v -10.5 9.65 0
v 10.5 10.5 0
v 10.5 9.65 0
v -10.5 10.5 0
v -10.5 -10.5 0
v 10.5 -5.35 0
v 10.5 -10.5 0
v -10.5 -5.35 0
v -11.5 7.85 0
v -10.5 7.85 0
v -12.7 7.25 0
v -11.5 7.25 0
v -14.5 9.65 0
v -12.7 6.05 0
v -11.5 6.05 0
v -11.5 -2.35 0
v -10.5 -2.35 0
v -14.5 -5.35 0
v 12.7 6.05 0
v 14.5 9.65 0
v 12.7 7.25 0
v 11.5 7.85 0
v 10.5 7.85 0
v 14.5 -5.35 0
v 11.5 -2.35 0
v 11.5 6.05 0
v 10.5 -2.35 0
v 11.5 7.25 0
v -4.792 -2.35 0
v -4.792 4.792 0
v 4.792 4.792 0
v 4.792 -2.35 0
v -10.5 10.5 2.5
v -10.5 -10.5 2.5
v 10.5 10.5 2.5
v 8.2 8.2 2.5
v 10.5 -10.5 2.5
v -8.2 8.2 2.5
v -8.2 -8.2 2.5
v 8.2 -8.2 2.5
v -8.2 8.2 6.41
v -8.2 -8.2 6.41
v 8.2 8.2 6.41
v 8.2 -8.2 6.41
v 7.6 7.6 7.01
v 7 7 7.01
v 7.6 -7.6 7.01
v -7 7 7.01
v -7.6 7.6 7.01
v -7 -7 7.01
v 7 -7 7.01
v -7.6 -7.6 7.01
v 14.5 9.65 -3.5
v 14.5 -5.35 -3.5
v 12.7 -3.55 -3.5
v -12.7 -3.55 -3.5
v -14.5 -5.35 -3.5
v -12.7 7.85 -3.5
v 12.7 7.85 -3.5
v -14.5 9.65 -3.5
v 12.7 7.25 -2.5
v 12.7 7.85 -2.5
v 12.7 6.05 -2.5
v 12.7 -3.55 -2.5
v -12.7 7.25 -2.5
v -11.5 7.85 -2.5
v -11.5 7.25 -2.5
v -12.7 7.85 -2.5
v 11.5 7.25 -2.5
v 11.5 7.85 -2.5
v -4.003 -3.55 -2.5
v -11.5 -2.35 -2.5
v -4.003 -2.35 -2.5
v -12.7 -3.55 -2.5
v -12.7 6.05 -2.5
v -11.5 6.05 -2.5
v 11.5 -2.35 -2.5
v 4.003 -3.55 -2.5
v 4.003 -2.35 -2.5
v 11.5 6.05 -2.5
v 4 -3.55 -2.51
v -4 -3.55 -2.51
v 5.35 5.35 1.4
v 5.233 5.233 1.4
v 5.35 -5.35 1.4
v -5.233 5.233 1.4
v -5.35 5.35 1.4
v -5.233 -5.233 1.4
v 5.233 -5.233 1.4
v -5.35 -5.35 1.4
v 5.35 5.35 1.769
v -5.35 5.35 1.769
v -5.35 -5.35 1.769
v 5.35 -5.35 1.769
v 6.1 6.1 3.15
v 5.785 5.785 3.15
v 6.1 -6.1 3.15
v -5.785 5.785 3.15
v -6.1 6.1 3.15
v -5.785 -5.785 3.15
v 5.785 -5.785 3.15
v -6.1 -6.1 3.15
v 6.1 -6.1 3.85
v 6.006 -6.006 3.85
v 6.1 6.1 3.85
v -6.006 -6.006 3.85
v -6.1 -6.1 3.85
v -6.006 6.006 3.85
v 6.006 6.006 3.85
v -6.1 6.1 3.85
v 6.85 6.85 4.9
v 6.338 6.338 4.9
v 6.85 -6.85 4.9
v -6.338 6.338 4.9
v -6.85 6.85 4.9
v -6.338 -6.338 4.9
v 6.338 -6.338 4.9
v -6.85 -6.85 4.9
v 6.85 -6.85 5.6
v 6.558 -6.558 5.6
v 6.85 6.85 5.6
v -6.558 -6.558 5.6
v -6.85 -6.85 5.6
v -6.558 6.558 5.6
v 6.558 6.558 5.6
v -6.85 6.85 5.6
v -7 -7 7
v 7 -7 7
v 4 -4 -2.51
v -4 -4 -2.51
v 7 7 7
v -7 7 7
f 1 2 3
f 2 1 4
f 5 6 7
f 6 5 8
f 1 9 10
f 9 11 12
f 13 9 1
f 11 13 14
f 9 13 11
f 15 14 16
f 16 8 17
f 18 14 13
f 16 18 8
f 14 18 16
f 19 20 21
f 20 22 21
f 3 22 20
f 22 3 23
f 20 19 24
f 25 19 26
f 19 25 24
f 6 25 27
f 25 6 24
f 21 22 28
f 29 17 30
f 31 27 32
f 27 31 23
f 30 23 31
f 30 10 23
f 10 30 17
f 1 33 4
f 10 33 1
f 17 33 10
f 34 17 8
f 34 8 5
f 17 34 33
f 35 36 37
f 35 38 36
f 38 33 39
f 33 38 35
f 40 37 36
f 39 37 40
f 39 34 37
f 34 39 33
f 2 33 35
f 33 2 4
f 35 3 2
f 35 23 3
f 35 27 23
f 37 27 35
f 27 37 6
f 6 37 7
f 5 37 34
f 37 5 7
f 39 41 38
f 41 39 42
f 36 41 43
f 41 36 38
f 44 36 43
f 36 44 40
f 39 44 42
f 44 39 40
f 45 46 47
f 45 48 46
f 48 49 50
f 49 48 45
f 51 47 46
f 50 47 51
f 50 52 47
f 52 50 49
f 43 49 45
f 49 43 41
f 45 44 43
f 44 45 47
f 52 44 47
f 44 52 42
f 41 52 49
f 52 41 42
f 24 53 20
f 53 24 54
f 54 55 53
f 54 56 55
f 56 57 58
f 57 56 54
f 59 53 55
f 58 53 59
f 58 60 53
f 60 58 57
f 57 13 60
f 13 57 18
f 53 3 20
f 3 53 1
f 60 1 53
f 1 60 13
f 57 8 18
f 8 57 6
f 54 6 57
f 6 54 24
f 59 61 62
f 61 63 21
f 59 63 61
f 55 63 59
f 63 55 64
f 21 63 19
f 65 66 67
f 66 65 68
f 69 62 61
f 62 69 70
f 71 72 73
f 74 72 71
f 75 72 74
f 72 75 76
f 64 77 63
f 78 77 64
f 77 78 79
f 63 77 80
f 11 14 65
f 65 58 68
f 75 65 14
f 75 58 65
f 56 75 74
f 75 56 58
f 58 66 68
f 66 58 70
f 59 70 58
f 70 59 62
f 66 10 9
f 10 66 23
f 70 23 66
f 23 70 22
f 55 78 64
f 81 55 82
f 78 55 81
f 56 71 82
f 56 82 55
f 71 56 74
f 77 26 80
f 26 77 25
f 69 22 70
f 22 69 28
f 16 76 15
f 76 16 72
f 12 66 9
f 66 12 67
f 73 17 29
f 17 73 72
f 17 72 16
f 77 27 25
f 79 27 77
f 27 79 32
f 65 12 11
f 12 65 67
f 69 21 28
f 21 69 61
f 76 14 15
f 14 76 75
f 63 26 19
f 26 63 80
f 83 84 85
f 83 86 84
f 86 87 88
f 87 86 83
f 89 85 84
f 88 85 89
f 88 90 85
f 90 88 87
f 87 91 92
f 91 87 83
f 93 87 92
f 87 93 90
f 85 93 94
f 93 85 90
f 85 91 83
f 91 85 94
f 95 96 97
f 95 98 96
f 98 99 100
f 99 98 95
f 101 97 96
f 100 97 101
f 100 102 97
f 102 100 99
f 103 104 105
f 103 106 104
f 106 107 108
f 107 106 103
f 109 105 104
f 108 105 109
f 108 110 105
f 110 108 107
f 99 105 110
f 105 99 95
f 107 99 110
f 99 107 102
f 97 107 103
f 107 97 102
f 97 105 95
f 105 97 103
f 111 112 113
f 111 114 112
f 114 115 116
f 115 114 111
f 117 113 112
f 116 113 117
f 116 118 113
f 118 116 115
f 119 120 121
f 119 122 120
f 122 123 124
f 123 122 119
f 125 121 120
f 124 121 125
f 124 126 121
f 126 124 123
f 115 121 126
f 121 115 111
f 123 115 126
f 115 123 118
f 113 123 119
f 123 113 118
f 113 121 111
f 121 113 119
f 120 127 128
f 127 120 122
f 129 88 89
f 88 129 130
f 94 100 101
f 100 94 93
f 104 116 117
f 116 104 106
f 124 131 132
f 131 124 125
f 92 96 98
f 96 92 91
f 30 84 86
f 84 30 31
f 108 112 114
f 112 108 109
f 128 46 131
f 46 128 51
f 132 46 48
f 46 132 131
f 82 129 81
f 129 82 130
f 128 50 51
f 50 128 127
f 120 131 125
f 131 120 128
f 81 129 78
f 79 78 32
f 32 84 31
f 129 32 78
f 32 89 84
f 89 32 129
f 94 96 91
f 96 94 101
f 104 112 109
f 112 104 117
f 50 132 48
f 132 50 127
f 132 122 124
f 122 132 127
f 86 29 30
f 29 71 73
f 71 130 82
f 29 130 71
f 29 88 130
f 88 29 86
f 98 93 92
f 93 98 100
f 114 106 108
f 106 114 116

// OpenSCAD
// VL53L0X carrier for Bender's LEFT eye.
//
// WHY HERE, AND NOT THE SEAM BETWEEN THE EYES
// -------------------------------------------
// The seam cannot take the board. Measured from the DroidFactory meshes on the
// NAS, and confirmed against the built head:
//
//   eyeball sphere diameter   89.43 mm   (119.240 mm stock, printed at 75%)
//   eye centre spacing        92.88 mm   (owner's calipers)
//   GAP BETWEEN THE EYEBALLS   3.45 mm
//
// The board is 11 mm wide. An 11 mm slot first appears 17.98 mm behind the eye
// centre plane, and the eyeballs stop existing at 23.29 mm, so there is a 3 mm
// window. A sensor in that window still has to see forward through the 3.45 mm
// throat at the equator. The VL53L0X's own emitter-to-receiver span is 4.4 mm,
// wider than the throat. Nothing usable gets out, and the sphere surfaces sit
// in the beam feeding it crosstalk.
//
// The owner's own custom eye solved it instead. BenderEye-Cust.FCStd hollows
// the stock eyeball, flat-cuts the back 31.06 mm behind centre (23.29 mm at
// 75%), and cuts a 22 x 22 mm square hole straight through the front on the
// eye axis. Printed, that hole measures 16.7 mm square. It is the twin of the
// one the Camera Module 3 looks through in the right eye, and it is already
// aimed exactly where a child stands.
//
// AXES
//   +z is forward, toward the child.
//   z = 0 is the flange's back face, which is also where the board's front
//   face lands. The die then looks straight up the bore.
//
// ORIENTATION AT ASSEMBLY
//   The snout is square, so the part drops into the square aperture in any of
//   four rotations. Pick whichever sends the header and its cable towards the
//   open back cut of the eye shell. Nothing in this file depends on it.
//
// FITTING
//   1. Slide the snout into the aperture from INSIDE the hollow eye shell.
//   2. The flange stops it and bears on the inner face of the eye's front wall.
//      That face is spherical and this flange is flat, so a gap of about 1 mm
//      is expected at the corners. Glue fills it.
//   3. Drop the board into the rails, face forward, die towards the bore.
//   4. Slide along the rails until the die is centred in the aperture. Sight
//      it through the front of the eye. The tolerance is wide: the beam is
//      7.50 mm across at the snout mouth inside a 14 mm bore, so the die may
//      sit over 3 mm off centre before anything clips.
//   5. Lock it. Two M3 screws if `posts` is true and the pitch below is right,
//      otherwise a dab of glue on the rails.
//
// NO WINDOW. Do not cover the aperture with acrylic or film. A cover needs the
// crosstalk calibration that the Adafruit CircuitPython driver does not expose.
// Print in matt BLACK. A reflective bore returns a short, STABLE reading with
// nobody there, and that latches the presence gate open while looking exactly
// like a healthy sensor. After fitting, set `presence_min_mm` from
// `venv/bin/python scripts/probe_vl53l0x.py --baseline`.

$fn = 64;

// ---------------------------------------------------------------------------
// Eye. MEASURED -- do not guess these.
// ---------------------------------------------------------------------------
aperture      = 16.7;   // square bore through the eye's front wall, calipers.
                        // Nominal 22.0 mm in CAD at 100%, 16.50 mm at 75%.
aperture_fit  = 0.30;   // clearance so the snout slides rather than forces
snout_len     = 4.5;    // The 16.7 mm bore is only 4.76 mm long: in front of
                        // it sits the stock 18.40 mm pupil recess, 3.26 mm
                        // deep. 4.5 keeps the snout in the bore it locates on.

// ---------------------------------------------------------------------------
// Board. The PCB is NOT flat on either face, and that drove this redesign.
// ---------------------------------------------------------------------------
board_l       = 25.0;   // MEASURED, lug tip to lug tip
board_w       = 11.0;   // MEASURED body width
board_t       = 1.0;    // MEASURED PCB thickness
board_fit     = 0.40;   // clearance around the board in the tray

// FRONT face, the side that looks at the child. Two things stand proud:
// the sensor package at about 1 mm, and the header's solder tails at about
// 2 mm. The board therefore cannot lie flat on the flange. It stands off by
// front_proj and rests on a ledge, with the middle relieved.
front_proj    = 2.5;    // CONFIRM from the photo. Must clear the TALLER of
                        // the two, with a little to spare.
die_h         = 1.0;    // MEASURED package height above the PCB front face
die_pkg_x     = 5.0;    // MEASURED package footprint
die_pkg_y     = 2.7;

// Die position, relative to the CENTRE of the board. The bore is aimed at the
// die, not at the board, so these two numbers decide where the tray sits.
// MEASURED: the package is mid-length, and sits 2.0 mm clear of the long edge
// opposite the header. Package is 2.7 mm across, so its centre is
// 2.0 + 1.35 = 3.35 mm from that edge, i.e. 5.5 - 3.35 = 2.15 mm off the
// board's centreline.
die_x         = 0.0;    // along the board length: mid-length
die_y         = -2.15;  // across the width, towards the edge away from header

header_side   = 1;      // +1 or -1: which long edge carries the header. That
                        // edge gets no ledge and no back support, so a
                        // straight or a right-angle header both clear. The
                        // snout is square, so rotate the part at assembly.

// Optional screws. Listings give M3 at 19.3 mm pitch on diagonal lugs, and no
// two sources agree on anything else, so this stays off until measured.
//
// The holes alone were a defect: at local (+-9.65, +-2.5) they land inside the
// relief cavity, which spans +-11.5 by +-4.5. The screw would have bitten on
// air. post_bosses() now puts material there first.
posts         = false;
lug_pitch     = 19.3;
lug_offset    = 2.5;
post_pilot    = 2.5;    // M3 self-tapping into PLA. 2.9 threads nothing.
post_boss_d   = 5.0;
post_depth    = 2.0;    // blind, into the flange. Total engagement 4.5 mm.

// ---------------------------------------------------------------------------
// Carrier
// ---------------------------------------------------------------------------
flange_w      = 21.0;   // must exceed the aperture so it cannot pull through
flange_t      = 2.5;
bore_back     = 8.0;    // square bore at the flange. Widened from 7.0 because
                        // the board now sits 2.5 mm further back. Not wider
                        // than 8.0: the die sits only 3.35 mm from the board
                        // edge, and the bore eats the pocket wall behind it.
bore_front    = 14.0;   // square bore at the snout mouth
wall_t        = 1.8;
ledge_w       = 1.2;    // how far the ledge reaches in under the board
lead_in       = 0.6;    // tapered length at the snout tip
bore_grooves  = true;   // light traps. Crosstalk is the documented failure
                        // that latches the gate open, so they stay on.
groove_n      = 3;
groove_depth  = 0.6;
groove_h      = 0.7;

// ---------------------------------------------------------------------------
// Back lid. The board is captured on five sides. The sixth, straight out of
// the back, was open. This closes it.
//
// It is a PRESS FIT, not a snap. The carrier is only 3.5 mm deep, so a latching
// finger would be 3.5 mm long and would need about 0.5 mm of deflection. That
// is roughly 7 % surface strain in PLA, far past yield: the finger breaks off
// instead of snapping over. A friction cap has no beam, so it has no strain
// limit. Four crush ribs carry the grip, because a flat interference fit of
// 0.15 mm is inside FDM dimensional noise and a rib is not.
//
// The skirts grip the two SHORT ends only. The part keeps its 15.0 mm width.
// ---------------------------------------------------------------------------
lid_t         = 3.0;    // plate thickness. Was 1.5. The relief below needs
                        // 1.8 mm of it, and 1.2 mm must remain as plate.
lid_relief    = 1.8;    // MEASURED by the owner: components stand about 1 mm
                        // proud of the PCB BACK face. The lid used to sit flat
                        // on that face, so it would have crushed them. The
                        // plate is now hollowed out over the board.
lid_rim       = 1.2;    // the bearing rim, measured in from the pocket edge.
                        // The pocket is 0.2 mm larger than the board per side,
                        // so the rim presses 1.0 mm of bare board edge.
lid_skirt_t   = 1.2;
lid_skirt_h   = 2.9;    // forward reach past the carrier back face. Stops
                        // 0.6 mm short of the flange back face.
lid_gap       = 0.15;   // slip clearance, skirt inner face to carrier
lid_rib       = 0.30;   // rib stands this far proud of that face, so the
                        // interference is 0.30 - 0.15 = 0.15 mm per side
lid_rib_y     = [-4.0, 4.0];  // local to the tray centre
lid_lead      = 0.8;    // ramped length at the skirt tip
lid_ribs      = true;   // off only for the seat clash test
lid_tab_w     = 7.0;    // pull tab, so the lid comes off without a tool
lid_tab_l     = 3.0;
hdr_slot_l    = 17.0;   // header opening in the plate
hdr_slot_w    = 3.5;

// ---------------------------------------------------------------------------
// Derived
// ---------------------------------------------------------------------------
snout_w   = aperture - aperture_fit;
bore_len  = flange_t + snout_len;
tray_l    = board_l + board_fit;
tray_w    = board_w + board_fit;
h         = header_side >= 0 ? 1 : -1;

// Optical path, measured from the TOP of the sensor package, which is what
// actually emits, not from the PCB face.
optical_len = bore_len + front_proj - die_h;
clear_half  = atan((bore_front - 4.4) / 2 / optical_len);
pkg_margin  = (bore_back - max(die_pkg_x, die_pkg_y)) / 2;
back_half   = atan((bore_back  - 4.4) / 2 / (front_proj - die_h));
beam_at_mouth = 4.4 + 2 * optical_len * tan(12.5);

tray_ox   = tray_l + 2 * wall_t;      // 29.0, carrier outer length
tray_oy   = tray_w + 2 * wall_t;      // 15.0, carrier outer width
lid_back  = -front_proj - board_t;    // the carrier back face
lid_in    = tray_ox / 2 + lid_gap;    // skirt inner face, from the tray centre
lid_ox    = tray_ox + 2 * (lid_gap + lid_skirt_t);
hdr_cy    = h * (board_w / 2 - 2.5);  // header centreline, local to the board

assert(flange_w > aperture,
       "flange must be wider than the aperture or it pulls through");
assert(front_proj > die_h,
       "front_proj must clear the sensor package");
assert(clear_half > 12.5,
       "snout bore clips the beam: widen bore_front or shorten snout_len");
assert(back_half > 12.5,
       "flange bore clips the beam: widen bore_back");
assert(bore_front < snout_w, "bore is wider than the snout wall");
assert(pkg_margin > 0.5,
       "package does not clear the flange bore: widen bore_back");
assert(!posts || lug_pitch / 2 - post_boss_d / 2 > bore_back / 2 + 0.5,
       "screw boss fouls the flange bore");
assert(lid_skirt_h < front_proj + board_t,
       "lid skirt reaches the flange back face");
assert(lid_rib > lid_gap,
       "lid ribs do not reach the carrier, so the cap has no grip");
assert(hdr_slot_w > 2.5,  "lid header slot is narrower than the header body");
assert(hdr_slot_l > 15.0, "lid header slot is shorter than the header body");
assert(lid_t - lid_relief >= 1.0,
       "lid plate is thinner than 1.0 mm over the component relief");
assert(lid_rim < ledge_w + (tray_w - board_w) / 2 + 1.0,
       "lid rim reaches further in than the ledge does on the other face");

// ---------------------------------------------------------------------------
// The real board, protrusions and all. Used by the clash test, never printed.
// ---------------------------------------------------------------------------
module board_model(hdr_len = 15.0, hdr_back = 2.5, eps = 0.02) {
    // Every solid is inset by eps. Two parts that merely TOUCH are a legal
    // fit, and without the inset CGAL reports the shared face as a clash.
    translate([-die_x, -die_y, 0]) {
        // PCB, front face at z = -front_proj
        translate([-board_l / 2 + eps, -board_w / 2 + eps,
                   -front_proj - board_t + eps])
            cube([board_l - 2 * eps, board_w - 2 * eps, board_t - 2 * eps]);
        // sensor package, on the front face, on the bore axis
        translate([die_x - die_pkg_x / 2 + eps, die_y - die_pkg_y / 2 + eps,
                   -front_proj + eps])
            cube([die_pkg_x - 2 * eps, die_pkg_y - 2 * eps, die_h - 2 * eps]);
        // header, standing off the BACK face along one long edge
        translate([-hdr_len / 2 + eps, h * (board_w / 2 - 2.5) - 1.25 + eps,
                   -front_proj - board_t - hdr_back + eps])
            cube([hdr_len - 2 * eps, 2.5 - 2 * eps, hdr_back - 2 * eps]);
    }
}

// ---------------------------------------------------------------------------
// Parts
// ---------------------------------------------------------------------------

module bore() {
    hull() {
        translate([0, 0, -front_proj - 0.01])
            linear_extrude(0.02) square(bore_back, center = true);
        translate([0, 0, bore_len])
            linear_extrude(0.01) square(bore_front, center = true);
    }
    if (bore_grooves)
        for (i = [1 : groove_n]) {
            z  = bore_len * i / (groove_n + 1);
            hw = bore_back / 2 + (bore_front - bore_back) / 2 * z / bore_len;
            translate([0, 0, z - groove_h / 2])
                linear_extrude(groove_h)
                    difference() {
                        square((hw + groove_depth) * 2, center = true);
                        square(hw * 2 - 0.2, center = true);
                    }
        }
}

module front() {
    linear_extrude(flange_t) square(flange_w, center = true);
    translate([0, 0, flange_t])
        linear_extrude(snout_len - lead_in) square(snout_w, center = true);
    translate([0, 0, flange_t + snout_len - lead_in])
        hull() {
            linear_extrude(0.01) square(snout_w, center = true);
            translate([0, 0, lead_in])
                linear_extrude(0.01) square(snout_w - 1.2, center = true);
        }
}

// Open tray. The board DROPS IN FROM THE BACK, it does not slide. Sliding
// needed clearance along the whole travel, and the protrusions make that
// impossible. Dropping in needs clearance only where each feature sits.
module tray() {
    translate([-die_x, -die_y, 0]) difference() {
        // block spanning the flange back face down to behind the PCB
        translate([-tray_l / 2 - wall_t, -tray_w / 2 - wall_t,
                   -front_proj - board_t])
            cube([tray_l + 2 * wall_t, tray_w + 2 * wall_t,
                  front_proj + board_t]);
        // board pocket
        translate([-tray_l / 2, -tray_w / 2, -front_proj - board_t])
            cube([tray_l, tray_w, board_t]);
        // relief above the board, inside the ledge
        translate([-tray_l / 2 + ledge_w, -tray_w / 2 + ledge_w, -front_proj])
            cube([tray_l - 2 * ledge_w, tray_w - 2 * ledge_w, front_proj]);
        // the header edge gets no ledge at all
        translate([-tray_l / 2 + ledge_w,
                   h > 0 ? tray_w / 2 - ledge_w : -tray_w / 2,
                   -front_proj])
            cube([tray_l - 2 * ledge_w, ledge_w, front_proj]);
        // open the header edge right through, so the solder tails clear
        translate([-tray_l / 2, h * (tray_w / 2 - ledge_w) - ledge_w / 2,
                   -front_proj])
            cube([tray_l, ledge_w, front_proj]);
    }
}

// Material for the screws to bite. Without this the pilot holes run through
// the relief cavity and thread nothing. Sits above the board, so it does not
// block the drop-in.
module post_bosses() {
    for (i = [-1, 1])
        translate([i * lug_pitch / 2 - die_x, i * lug_offset - die_y,
                   -front_proj])
            cylinder(h = front_proj, d = post_boss_d, $fn = 36);
}

module post_holes() {
    for (i = [-1, 1])
        translate([i * lug_pitch / 2 - die_x, i * lug_offset - die_y,
                   -front_proj - board_t - 0.1])
            cylinder(h = front_proj + board_t + post_depth + 0.1,
                     d = post_pilot, $fn = 24);
}

// RETENTION. The pocket holds the board on all four sides. The only free
// direction is straight out of the back. lid() closes it. Two M3 screws are an
// alternative once the lug pitch is confirmed. Nothing in the eye pushes the
// board backwards, so this is light duty either way.
module carrier() {
    difference() {
        union() {
            front();
            tray();
            if (posts) post_bosses();
        }
        bore();
        if (posts) post_holes();
    }
}

// ---------------------------------------------------------------------------
// Back lid. Print separately. Pushes on from behind, over the two short ends.
// ---------------------------------------------------------------------------
module lid_rib(sx, ry) {
    zb = lid_back - lid_t;
    zt = lid_back + lid_skirt_h - lid_lead;
    hull() {
        translate([sx * lid_in, ry, zb])
            cylinder(h = zt - zb, r = lid_rib, $fn = 20);
        translate([sx * lid_in, ry, zt + lid_lead])
            cylinder(h = 0.01, r = 0.01, $fn = 8);
    }
}

module lid() {
    translate([-die_x, -die_y, 0]) difference() {
        union() {
            // plate, over the whole carrier back face
            translate([-lid_ox / 2, -tray_oy / 2, lid_back - lid_t])
                cube([lid_ox, tray_oy, lid_t]);
            // pull tab, on the edge away from the header
            translate([-lid_tab_w / 2, -h * (tray_oy / 2 + lid_tab_l),
                       lid_back - lid_t])
                cube([lid_tab_w, lid_tab_l, lid_t]);
            // skirts, on the two short ends only
            for (sx = [-1, 1])
                translate([sx > 0 ? lid_in : -lid_in - lid_skirt_t,
                           -tray_oy / 2, lid_back - lid_t])
                    cube([lid_skirt_t, tray_oy, lid_t + lid_skirt_h]);
            // crush ribs, four of them, running along the push direction
            if (lid_ribs) for (sx = [-1, 1], ry = lid_rib_y) lid_rib(sx, ry);
        }
        // relief over the components on the back of the PCB. The lid bears
        // on a rim of bare board edge, not on the components.
        translate([-(tray_l / 2 - lid_rim), -(tray_w / 2 - lid_rim),
                   lid_back - lid_relief])
            cube([tray_l - 2 * lid_rim, tray_w - 2 * lid_rim,
                  lid_relief + 0.01]);
        // the header body and its pins pass straight through
        translate([-hdr_slot_l / 2, hdr_cy - hdr_slot_w / 2,
                   lid_back - lid_t - 0.5])
            cube([hdr_slot_l, hdr_slot_w, lid_t + 1.0]);
        // clearance for the screws, when they are used
        if (posts) post_holes();
    }
}

part = "carrier";          // "carrier" or "lid". Print one, then the other.
if      (part == "lid")     lid();
else if (part == "carrier") carrier();

echo(str("aperture ", aperture, " -> snout ", snout_w, " square, ",
         snout_len, " mm deep"));
echo(str("board stands off the flange by ", front_proj, " mm"));
echo(str("package ", die_pkg_x, " x ", die_pkg_y, " x ", die_h,
         " mm, clears the ", bore_back, " mm bore by ", pkg_margin, " mm"));
echo(str("optical path, package face to snout mouth ", optical_len, " mm"));
echo(str("clear half-angle: snout ", clear_half, " deg, flange ", back_half,
         " deg (need 12.5)"));
echo(str("beam at snout mouth ", beam_at_mouth, " mm in a ", bore_front,
         " mm bore, clearance ", (bore_front - beam_at_mouth) / 2, " mm"));
echo(str("tray ", tray_l, " x ", tray_w, " mm, header edge ",
         h > 0 ? "+y" : "-y", " fully open"));
echo(str("lid ", lid_ox, " x ", tray_oy, " x ", lid_t + lid_skirt_h,
         " mm, grip interference ", lid_rib - lid_gap, " mm per side"));
echo(str("lid relief ", tray_l - 2 * lid_rim, " x ", tray_w - 2 * lid_rim,
         " x ", lid_relief, " mm deep, plate left ", lid_t - lid_relief, " mm"));
echo(str("lid bears on ", lid_rim - (tray_w - board_w) / 2,
         " mm of bare board edge"));
